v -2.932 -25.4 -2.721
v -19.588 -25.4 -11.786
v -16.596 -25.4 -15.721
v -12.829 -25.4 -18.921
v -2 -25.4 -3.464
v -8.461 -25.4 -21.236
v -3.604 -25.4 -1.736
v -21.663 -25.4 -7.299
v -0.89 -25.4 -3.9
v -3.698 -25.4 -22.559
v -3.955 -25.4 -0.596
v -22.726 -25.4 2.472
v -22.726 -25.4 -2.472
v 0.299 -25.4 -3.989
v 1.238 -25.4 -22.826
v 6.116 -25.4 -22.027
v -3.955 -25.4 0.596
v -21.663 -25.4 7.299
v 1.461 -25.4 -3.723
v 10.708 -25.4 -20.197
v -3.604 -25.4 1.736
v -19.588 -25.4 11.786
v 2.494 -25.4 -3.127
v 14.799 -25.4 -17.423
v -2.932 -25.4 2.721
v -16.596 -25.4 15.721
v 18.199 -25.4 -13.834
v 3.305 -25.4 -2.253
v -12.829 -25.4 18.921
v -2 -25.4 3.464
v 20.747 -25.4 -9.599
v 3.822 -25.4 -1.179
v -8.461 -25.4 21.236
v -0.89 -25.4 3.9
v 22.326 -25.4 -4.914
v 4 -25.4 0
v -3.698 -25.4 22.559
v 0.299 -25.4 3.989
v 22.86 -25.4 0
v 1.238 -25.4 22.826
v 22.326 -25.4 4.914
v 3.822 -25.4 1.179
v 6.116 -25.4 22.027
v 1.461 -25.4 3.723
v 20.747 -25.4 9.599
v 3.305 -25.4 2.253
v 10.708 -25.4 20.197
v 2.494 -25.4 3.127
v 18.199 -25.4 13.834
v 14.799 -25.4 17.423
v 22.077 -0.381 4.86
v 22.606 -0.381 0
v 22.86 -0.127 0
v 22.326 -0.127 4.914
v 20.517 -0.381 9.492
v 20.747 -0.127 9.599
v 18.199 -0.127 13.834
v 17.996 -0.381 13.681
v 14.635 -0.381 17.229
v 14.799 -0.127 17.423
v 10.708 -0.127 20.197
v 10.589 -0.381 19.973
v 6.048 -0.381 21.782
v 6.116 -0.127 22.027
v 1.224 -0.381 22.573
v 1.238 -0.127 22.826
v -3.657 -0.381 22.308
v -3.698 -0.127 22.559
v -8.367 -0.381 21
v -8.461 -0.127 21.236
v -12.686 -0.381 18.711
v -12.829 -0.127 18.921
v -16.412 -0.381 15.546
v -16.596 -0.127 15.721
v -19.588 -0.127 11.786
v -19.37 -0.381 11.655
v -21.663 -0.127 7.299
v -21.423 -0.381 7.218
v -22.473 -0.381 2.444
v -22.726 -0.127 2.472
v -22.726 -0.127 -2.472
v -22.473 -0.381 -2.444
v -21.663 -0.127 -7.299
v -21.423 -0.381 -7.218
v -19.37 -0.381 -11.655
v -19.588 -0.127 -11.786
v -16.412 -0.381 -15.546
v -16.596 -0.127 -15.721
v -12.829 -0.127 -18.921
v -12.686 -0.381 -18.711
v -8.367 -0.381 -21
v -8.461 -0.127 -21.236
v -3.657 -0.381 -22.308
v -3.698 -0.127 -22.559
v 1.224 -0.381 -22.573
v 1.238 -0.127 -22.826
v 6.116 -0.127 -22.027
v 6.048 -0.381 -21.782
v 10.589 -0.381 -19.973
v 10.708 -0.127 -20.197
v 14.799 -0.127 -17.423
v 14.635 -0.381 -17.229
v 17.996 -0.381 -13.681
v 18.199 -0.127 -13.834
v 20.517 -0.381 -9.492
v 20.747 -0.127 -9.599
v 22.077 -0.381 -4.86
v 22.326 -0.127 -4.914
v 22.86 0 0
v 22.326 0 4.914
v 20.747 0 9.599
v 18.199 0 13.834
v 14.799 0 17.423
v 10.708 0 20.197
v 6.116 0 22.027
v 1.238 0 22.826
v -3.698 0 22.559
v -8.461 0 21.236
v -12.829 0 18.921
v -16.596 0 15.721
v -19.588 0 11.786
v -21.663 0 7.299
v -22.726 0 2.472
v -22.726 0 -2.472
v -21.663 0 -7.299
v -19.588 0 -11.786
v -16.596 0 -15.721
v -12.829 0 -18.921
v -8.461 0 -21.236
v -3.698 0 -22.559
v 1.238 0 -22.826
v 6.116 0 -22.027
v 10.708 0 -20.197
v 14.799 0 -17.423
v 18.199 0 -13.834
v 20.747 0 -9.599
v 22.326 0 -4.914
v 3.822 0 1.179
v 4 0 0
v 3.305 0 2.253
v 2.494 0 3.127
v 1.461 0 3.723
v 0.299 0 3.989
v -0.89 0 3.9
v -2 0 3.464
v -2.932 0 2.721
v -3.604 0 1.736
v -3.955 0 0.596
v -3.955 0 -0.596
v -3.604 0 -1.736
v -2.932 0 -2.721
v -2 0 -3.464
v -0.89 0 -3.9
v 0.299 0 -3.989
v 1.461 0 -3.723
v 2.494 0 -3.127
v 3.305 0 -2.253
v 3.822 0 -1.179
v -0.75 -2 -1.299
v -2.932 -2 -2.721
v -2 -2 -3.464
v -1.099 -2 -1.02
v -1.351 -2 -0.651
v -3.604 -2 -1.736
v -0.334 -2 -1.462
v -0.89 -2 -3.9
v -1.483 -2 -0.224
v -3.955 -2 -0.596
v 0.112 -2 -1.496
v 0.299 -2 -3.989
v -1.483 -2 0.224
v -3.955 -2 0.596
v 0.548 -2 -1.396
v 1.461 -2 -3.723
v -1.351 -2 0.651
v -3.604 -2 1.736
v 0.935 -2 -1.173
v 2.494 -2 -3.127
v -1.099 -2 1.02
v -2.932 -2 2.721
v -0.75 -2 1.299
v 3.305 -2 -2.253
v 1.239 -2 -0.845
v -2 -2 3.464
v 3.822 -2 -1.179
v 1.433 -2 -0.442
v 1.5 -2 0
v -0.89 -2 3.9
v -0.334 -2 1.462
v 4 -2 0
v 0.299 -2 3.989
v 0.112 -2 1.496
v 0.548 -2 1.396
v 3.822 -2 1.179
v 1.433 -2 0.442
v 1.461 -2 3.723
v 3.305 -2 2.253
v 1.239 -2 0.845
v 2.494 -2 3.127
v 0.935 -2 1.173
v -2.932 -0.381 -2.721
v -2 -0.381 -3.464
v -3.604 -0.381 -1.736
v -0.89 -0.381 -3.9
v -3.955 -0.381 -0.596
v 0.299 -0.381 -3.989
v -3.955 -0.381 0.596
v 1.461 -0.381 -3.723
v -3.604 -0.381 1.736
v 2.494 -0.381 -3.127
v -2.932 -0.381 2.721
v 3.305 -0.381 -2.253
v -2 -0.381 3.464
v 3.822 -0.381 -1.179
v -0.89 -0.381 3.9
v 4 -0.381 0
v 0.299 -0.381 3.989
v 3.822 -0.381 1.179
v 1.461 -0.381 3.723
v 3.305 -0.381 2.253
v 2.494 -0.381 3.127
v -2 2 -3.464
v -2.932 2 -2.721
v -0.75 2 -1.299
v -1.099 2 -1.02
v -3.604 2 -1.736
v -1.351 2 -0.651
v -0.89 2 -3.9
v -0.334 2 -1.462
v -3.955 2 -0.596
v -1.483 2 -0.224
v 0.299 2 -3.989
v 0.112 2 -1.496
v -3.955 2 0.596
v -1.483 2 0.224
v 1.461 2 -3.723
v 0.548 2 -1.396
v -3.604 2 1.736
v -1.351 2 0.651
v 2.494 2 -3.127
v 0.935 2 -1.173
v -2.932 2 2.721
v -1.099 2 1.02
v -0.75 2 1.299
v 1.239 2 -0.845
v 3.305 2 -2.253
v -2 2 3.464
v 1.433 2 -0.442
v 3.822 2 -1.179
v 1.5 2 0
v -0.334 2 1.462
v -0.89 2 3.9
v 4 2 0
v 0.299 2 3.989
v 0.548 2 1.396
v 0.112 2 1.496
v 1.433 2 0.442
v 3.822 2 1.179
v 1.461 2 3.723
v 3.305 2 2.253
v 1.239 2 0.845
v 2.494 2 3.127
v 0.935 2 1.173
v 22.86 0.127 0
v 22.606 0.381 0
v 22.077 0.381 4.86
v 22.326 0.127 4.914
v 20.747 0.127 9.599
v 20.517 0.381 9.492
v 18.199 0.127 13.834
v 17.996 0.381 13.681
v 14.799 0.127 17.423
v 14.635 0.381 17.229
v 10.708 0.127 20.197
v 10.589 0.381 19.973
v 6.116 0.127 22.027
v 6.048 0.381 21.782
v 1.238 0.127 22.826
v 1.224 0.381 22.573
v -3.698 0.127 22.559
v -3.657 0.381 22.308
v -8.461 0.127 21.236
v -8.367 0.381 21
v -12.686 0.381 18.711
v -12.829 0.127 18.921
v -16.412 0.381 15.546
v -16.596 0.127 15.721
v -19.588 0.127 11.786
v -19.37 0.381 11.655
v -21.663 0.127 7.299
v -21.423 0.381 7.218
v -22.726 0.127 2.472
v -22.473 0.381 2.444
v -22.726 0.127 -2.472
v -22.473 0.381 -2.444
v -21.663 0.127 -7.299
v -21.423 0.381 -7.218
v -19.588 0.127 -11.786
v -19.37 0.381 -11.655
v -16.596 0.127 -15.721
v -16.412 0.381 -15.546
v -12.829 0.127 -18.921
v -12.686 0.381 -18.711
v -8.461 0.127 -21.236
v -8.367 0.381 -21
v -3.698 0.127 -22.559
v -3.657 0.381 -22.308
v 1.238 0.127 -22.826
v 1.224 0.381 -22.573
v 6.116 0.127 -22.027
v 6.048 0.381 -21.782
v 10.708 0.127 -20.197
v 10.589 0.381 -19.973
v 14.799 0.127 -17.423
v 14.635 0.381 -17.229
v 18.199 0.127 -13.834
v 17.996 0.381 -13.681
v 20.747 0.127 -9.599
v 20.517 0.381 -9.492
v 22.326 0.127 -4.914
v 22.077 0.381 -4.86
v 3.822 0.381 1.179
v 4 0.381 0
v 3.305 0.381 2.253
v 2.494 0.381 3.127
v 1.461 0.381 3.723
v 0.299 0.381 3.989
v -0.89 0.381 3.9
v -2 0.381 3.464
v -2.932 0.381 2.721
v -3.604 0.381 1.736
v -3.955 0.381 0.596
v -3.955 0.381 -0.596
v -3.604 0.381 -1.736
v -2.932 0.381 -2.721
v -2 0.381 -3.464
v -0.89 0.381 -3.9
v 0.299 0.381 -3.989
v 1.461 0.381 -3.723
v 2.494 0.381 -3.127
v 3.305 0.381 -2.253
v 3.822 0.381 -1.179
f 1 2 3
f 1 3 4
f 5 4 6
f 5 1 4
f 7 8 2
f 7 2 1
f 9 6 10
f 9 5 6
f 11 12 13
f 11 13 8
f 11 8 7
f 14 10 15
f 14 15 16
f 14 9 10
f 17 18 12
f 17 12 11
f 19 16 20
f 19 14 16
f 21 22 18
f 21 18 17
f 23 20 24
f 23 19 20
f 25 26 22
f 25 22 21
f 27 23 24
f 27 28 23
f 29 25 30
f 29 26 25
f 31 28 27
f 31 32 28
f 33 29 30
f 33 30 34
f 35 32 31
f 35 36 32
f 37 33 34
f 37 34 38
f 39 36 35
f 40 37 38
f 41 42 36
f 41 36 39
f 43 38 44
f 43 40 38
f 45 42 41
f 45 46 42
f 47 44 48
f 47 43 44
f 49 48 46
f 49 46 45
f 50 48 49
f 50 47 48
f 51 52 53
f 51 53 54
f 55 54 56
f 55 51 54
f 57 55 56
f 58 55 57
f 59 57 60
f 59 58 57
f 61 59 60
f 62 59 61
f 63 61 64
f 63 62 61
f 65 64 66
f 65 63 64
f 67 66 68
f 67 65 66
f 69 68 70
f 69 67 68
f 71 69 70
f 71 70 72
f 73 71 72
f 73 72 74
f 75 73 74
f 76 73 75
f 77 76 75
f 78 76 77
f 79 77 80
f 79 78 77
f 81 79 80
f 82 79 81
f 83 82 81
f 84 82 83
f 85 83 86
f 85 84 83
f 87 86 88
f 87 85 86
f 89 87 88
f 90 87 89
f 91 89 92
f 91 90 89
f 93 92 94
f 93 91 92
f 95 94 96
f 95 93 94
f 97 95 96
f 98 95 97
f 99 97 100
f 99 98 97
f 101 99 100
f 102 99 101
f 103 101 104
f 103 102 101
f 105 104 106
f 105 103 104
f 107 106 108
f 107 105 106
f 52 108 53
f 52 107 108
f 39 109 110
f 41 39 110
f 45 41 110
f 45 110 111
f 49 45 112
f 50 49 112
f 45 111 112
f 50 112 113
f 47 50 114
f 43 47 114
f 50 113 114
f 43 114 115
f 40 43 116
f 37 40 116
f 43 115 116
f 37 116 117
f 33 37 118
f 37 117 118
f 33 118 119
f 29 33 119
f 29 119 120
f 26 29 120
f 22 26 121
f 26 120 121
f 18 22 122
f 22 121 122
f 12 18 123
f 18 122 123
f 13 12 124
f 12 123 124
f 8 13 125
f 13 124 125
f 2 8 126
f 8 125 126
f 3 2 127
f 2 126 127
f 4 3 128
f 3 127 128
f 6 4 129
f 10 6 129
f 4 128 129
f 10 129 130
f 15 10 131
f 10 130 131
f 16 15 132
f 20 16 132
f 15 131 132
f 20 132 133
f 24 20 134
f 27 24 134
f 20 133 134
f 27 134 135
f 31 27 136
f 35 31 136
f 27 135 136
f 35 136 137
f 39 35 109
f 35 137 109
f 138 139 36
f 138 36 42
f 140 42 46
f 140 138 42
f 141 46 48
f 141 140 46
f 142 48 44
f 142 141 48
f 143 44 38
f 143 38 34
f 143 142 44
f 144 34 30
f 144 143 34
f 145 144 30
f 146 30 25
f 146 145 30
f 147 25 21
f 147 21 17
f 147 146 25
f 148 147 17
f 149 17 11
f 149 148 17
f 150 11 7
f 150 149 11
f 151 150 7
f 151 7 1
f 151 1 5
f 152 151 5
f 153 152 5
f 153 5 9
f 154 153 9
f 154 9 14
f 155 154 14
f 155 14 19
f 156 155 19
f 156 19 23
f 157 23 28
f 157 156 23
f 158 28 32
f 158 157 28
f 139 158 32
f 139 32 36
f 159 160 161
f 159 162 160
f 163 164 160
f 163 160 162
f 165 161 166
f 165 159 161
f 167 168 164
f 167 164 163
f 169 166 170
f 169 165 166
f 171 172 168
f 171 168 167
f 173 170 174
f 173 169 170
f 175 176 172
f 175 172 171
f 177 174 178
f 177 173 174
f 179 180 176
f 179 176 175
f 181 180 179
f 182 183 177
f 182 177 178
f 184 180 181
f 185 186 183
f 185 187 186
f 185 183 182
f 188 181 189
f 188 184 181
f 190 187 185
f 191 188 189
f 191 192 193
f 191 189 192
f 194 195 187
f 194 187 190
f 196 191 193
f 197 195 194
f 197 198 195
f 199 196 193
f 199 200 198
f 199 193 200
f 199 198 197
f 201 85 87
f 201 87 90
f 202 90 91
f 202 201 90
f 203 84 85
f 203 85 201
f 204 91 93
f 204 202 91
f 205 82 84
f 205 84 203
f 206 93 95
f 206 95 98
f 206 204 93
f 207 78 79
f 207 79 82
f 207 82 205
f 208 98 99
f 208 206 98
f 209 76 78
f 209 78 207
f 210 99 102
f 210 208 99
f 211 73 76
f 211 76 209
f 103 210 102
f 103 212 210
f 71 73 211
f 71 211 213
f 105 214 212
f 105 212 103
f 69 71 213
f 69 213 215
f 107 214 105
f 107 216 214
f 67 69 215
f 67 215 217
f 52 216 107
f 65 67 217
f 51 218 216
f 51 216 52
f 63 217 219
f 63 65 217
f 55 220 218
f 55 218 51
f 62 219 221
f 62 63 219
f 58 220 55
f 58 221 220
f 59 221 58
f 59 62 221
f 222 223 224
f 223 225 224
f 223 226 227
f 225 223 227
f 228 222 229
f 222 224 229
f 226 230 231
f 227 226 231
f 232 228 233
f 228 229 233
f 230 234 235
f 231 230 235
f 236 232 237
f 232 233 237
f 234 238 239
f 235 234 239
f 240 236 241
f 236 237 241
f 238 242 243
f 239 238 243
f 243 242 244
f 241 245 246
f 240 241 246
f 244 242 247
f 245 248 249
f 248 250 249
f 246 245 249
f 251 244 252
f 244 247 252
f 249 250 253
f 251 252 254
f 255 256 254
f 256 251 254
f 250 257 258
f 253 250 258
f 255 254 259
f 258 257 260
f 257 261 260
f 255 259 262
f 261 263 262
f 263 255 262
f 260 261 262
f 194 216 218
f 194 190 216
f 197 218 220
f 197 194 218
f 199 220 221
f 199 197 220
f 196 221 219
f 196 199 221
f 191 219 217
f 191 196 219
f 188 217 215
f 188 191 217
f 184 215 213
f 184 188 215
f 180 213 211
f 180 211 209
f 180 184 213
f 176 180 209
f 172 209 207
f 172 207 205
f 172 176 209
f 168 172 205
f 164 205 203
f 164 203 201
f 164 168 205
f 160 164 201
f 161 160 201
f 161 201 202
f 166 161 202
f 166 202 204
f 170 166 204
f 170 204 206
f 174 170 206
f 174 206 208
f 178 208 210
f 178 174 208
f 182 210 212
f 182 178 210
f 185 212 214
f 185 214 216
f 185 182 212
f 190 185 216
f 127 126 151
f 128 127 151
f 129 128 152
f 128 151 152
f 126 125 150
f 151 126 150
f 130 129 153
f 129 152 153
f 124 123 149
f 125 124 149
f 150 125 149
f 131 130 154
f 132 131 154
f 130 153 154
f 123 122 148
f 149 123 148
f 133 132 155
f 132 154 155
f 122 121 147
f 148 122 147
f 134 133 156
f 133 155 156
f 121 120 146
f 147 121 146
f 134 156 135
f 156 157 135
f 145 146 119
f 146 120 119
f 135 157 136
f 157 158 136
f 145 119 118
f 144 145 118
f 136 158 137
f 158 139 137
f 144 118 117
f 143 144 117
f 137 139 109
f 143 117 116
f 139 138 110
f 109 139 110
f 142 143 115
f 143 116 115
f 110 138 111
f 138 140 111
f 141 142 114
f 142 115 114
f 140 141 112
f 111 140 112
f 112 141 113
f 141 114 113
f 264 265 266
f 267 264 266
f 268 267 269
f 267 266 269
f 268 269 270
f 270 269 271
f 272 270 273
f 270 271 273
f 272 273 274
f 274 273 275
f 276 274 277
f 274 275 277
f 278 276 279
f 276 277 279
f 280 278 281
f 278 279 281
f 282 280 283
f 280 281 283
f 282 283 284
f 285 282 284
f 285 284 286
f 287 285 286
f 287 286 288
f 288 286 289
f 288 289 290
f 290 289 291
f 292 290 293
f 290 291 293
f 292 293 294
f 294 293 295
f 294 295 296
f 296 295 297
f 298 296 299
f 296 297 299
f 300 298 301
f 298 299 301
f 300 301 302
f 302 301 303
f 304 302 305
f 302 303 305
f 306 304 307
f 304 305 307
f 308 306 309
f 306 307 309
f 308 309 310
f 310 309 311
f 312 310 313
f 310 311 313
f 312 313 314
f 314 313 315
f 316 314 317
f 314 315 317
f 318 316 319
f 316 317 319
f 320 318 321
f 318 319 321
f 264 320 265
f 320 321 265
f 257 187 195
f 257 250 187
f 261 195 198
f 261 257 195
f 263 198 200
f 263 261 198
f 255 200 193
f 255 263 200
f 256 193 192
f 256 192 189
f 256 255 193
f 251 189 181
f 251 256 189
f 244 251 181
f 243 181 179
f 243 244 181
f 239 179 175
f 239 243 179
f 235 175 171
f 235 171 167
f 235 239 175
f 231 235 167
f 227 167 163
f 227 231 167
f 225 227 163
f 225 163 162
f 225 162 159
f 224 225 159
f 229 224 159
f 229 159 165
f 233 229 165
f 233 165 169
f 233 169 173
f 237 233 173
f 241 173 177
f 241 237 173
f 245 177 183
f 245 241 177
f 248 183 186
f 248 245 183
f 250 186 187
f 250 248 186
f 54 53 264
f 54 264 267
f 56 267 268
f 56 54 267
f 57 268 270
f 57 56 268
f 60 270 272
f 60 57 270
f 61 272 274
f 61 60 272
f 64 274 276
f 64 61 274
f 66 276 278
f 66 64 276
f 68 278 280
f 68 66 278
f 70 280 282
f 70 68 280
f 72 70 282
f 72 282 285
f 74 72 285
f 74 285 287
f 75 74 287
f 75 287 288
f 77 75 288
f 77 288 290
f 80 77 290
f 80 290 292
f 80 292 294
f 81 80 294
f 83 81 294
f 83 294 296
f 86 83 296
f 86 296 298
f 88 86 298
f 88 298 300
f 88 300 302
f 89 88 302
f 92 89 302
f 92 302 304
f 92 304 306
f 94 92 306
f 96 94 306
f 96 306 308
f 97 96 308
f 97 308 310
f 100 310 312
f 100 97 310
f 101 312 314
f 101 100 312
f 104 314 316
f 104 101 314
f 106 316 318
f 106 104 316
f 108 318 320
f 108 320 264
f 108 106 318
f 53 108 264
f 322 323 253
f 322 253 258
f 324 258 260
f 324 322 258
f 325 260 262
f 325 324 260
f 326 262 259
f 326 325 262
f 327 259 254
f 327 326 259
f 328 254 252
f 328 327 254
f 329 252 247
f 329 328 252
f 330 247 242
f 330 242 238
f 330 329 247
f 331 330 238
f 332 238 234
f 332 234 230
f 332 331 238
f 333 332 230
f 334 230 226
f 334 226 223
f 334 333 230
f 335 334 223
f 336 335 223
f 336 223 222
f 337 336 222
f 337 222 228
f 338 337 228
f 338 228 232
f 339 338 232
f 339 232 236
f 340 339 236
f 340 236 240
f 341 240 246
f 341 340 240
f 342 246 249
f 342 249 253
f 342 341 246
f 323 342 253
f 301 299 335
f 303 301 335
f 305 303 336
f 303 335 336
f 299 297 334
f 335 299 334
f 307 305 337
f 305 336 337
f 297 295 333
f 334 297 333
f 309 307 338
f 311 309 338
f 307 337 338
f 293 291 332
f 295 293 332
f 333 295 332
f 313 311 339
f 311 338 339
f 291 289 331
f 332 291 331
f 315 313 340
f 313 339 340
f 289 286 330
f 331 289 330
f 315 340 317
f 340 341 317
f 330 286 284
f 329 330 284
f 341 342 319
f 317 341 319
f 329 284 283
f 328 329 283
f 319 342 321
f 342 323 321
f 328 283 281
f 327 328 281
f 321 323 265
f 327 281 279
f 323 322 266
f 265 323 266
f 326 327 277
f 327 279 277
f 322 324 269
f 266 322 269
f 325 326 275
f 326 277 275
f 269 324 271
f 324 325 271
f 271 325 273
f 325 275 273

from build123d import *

# Parameters (mm, degrees)
F0_R     = 22.86
F0_R_2   = 3.999992
F1_DEPTH = 0.381
F2_SIZE  = 0.254
F3_R     = 3.999992
F3_R_2   = 1.49987
F4_DEPTH = 1.999996
F5_DEPTH = 25.4


with BuildPart() as f1:
    # F0 (on Front) → F1 (new body, symmetric)
    with BuildSketch(Plane.XZ):
        Circle(F0_R)
        Circle(F0_R_2, mode=Mode.SUBTRACT)
    extrude(amount=F1_DEPTH, both=True)

    # F2
    f2_edges = [f1.edges().sort_by_distance(p)[0] for p in [
        (-22.86, -0.381, 0),
        (-22.86, 0.381, 0),
    ]]
    chamfer(f2_edges, length=F2_SIZE)

    # F3 (on Front) → F4 (join, symmetric)
    with BuildSketch(Plane.XZ):
        Circle(F3_R)
        Circle(F3_R_2, mode=Mode.SUBTRACT)
    extrude(amount=F4_DEPTH, both=True)


with BuildPart() as f5:
    # F0 (on Front) → F5 (new body)
    with BuildSketch(Plane.XZ):
        Circle(F0_R)
        Circle(F0_R_2, mode=Mode.SUBTRACT)
    extrude(amount=F5_DEPTH)


solid = Compound([f1.part, f5.part])
